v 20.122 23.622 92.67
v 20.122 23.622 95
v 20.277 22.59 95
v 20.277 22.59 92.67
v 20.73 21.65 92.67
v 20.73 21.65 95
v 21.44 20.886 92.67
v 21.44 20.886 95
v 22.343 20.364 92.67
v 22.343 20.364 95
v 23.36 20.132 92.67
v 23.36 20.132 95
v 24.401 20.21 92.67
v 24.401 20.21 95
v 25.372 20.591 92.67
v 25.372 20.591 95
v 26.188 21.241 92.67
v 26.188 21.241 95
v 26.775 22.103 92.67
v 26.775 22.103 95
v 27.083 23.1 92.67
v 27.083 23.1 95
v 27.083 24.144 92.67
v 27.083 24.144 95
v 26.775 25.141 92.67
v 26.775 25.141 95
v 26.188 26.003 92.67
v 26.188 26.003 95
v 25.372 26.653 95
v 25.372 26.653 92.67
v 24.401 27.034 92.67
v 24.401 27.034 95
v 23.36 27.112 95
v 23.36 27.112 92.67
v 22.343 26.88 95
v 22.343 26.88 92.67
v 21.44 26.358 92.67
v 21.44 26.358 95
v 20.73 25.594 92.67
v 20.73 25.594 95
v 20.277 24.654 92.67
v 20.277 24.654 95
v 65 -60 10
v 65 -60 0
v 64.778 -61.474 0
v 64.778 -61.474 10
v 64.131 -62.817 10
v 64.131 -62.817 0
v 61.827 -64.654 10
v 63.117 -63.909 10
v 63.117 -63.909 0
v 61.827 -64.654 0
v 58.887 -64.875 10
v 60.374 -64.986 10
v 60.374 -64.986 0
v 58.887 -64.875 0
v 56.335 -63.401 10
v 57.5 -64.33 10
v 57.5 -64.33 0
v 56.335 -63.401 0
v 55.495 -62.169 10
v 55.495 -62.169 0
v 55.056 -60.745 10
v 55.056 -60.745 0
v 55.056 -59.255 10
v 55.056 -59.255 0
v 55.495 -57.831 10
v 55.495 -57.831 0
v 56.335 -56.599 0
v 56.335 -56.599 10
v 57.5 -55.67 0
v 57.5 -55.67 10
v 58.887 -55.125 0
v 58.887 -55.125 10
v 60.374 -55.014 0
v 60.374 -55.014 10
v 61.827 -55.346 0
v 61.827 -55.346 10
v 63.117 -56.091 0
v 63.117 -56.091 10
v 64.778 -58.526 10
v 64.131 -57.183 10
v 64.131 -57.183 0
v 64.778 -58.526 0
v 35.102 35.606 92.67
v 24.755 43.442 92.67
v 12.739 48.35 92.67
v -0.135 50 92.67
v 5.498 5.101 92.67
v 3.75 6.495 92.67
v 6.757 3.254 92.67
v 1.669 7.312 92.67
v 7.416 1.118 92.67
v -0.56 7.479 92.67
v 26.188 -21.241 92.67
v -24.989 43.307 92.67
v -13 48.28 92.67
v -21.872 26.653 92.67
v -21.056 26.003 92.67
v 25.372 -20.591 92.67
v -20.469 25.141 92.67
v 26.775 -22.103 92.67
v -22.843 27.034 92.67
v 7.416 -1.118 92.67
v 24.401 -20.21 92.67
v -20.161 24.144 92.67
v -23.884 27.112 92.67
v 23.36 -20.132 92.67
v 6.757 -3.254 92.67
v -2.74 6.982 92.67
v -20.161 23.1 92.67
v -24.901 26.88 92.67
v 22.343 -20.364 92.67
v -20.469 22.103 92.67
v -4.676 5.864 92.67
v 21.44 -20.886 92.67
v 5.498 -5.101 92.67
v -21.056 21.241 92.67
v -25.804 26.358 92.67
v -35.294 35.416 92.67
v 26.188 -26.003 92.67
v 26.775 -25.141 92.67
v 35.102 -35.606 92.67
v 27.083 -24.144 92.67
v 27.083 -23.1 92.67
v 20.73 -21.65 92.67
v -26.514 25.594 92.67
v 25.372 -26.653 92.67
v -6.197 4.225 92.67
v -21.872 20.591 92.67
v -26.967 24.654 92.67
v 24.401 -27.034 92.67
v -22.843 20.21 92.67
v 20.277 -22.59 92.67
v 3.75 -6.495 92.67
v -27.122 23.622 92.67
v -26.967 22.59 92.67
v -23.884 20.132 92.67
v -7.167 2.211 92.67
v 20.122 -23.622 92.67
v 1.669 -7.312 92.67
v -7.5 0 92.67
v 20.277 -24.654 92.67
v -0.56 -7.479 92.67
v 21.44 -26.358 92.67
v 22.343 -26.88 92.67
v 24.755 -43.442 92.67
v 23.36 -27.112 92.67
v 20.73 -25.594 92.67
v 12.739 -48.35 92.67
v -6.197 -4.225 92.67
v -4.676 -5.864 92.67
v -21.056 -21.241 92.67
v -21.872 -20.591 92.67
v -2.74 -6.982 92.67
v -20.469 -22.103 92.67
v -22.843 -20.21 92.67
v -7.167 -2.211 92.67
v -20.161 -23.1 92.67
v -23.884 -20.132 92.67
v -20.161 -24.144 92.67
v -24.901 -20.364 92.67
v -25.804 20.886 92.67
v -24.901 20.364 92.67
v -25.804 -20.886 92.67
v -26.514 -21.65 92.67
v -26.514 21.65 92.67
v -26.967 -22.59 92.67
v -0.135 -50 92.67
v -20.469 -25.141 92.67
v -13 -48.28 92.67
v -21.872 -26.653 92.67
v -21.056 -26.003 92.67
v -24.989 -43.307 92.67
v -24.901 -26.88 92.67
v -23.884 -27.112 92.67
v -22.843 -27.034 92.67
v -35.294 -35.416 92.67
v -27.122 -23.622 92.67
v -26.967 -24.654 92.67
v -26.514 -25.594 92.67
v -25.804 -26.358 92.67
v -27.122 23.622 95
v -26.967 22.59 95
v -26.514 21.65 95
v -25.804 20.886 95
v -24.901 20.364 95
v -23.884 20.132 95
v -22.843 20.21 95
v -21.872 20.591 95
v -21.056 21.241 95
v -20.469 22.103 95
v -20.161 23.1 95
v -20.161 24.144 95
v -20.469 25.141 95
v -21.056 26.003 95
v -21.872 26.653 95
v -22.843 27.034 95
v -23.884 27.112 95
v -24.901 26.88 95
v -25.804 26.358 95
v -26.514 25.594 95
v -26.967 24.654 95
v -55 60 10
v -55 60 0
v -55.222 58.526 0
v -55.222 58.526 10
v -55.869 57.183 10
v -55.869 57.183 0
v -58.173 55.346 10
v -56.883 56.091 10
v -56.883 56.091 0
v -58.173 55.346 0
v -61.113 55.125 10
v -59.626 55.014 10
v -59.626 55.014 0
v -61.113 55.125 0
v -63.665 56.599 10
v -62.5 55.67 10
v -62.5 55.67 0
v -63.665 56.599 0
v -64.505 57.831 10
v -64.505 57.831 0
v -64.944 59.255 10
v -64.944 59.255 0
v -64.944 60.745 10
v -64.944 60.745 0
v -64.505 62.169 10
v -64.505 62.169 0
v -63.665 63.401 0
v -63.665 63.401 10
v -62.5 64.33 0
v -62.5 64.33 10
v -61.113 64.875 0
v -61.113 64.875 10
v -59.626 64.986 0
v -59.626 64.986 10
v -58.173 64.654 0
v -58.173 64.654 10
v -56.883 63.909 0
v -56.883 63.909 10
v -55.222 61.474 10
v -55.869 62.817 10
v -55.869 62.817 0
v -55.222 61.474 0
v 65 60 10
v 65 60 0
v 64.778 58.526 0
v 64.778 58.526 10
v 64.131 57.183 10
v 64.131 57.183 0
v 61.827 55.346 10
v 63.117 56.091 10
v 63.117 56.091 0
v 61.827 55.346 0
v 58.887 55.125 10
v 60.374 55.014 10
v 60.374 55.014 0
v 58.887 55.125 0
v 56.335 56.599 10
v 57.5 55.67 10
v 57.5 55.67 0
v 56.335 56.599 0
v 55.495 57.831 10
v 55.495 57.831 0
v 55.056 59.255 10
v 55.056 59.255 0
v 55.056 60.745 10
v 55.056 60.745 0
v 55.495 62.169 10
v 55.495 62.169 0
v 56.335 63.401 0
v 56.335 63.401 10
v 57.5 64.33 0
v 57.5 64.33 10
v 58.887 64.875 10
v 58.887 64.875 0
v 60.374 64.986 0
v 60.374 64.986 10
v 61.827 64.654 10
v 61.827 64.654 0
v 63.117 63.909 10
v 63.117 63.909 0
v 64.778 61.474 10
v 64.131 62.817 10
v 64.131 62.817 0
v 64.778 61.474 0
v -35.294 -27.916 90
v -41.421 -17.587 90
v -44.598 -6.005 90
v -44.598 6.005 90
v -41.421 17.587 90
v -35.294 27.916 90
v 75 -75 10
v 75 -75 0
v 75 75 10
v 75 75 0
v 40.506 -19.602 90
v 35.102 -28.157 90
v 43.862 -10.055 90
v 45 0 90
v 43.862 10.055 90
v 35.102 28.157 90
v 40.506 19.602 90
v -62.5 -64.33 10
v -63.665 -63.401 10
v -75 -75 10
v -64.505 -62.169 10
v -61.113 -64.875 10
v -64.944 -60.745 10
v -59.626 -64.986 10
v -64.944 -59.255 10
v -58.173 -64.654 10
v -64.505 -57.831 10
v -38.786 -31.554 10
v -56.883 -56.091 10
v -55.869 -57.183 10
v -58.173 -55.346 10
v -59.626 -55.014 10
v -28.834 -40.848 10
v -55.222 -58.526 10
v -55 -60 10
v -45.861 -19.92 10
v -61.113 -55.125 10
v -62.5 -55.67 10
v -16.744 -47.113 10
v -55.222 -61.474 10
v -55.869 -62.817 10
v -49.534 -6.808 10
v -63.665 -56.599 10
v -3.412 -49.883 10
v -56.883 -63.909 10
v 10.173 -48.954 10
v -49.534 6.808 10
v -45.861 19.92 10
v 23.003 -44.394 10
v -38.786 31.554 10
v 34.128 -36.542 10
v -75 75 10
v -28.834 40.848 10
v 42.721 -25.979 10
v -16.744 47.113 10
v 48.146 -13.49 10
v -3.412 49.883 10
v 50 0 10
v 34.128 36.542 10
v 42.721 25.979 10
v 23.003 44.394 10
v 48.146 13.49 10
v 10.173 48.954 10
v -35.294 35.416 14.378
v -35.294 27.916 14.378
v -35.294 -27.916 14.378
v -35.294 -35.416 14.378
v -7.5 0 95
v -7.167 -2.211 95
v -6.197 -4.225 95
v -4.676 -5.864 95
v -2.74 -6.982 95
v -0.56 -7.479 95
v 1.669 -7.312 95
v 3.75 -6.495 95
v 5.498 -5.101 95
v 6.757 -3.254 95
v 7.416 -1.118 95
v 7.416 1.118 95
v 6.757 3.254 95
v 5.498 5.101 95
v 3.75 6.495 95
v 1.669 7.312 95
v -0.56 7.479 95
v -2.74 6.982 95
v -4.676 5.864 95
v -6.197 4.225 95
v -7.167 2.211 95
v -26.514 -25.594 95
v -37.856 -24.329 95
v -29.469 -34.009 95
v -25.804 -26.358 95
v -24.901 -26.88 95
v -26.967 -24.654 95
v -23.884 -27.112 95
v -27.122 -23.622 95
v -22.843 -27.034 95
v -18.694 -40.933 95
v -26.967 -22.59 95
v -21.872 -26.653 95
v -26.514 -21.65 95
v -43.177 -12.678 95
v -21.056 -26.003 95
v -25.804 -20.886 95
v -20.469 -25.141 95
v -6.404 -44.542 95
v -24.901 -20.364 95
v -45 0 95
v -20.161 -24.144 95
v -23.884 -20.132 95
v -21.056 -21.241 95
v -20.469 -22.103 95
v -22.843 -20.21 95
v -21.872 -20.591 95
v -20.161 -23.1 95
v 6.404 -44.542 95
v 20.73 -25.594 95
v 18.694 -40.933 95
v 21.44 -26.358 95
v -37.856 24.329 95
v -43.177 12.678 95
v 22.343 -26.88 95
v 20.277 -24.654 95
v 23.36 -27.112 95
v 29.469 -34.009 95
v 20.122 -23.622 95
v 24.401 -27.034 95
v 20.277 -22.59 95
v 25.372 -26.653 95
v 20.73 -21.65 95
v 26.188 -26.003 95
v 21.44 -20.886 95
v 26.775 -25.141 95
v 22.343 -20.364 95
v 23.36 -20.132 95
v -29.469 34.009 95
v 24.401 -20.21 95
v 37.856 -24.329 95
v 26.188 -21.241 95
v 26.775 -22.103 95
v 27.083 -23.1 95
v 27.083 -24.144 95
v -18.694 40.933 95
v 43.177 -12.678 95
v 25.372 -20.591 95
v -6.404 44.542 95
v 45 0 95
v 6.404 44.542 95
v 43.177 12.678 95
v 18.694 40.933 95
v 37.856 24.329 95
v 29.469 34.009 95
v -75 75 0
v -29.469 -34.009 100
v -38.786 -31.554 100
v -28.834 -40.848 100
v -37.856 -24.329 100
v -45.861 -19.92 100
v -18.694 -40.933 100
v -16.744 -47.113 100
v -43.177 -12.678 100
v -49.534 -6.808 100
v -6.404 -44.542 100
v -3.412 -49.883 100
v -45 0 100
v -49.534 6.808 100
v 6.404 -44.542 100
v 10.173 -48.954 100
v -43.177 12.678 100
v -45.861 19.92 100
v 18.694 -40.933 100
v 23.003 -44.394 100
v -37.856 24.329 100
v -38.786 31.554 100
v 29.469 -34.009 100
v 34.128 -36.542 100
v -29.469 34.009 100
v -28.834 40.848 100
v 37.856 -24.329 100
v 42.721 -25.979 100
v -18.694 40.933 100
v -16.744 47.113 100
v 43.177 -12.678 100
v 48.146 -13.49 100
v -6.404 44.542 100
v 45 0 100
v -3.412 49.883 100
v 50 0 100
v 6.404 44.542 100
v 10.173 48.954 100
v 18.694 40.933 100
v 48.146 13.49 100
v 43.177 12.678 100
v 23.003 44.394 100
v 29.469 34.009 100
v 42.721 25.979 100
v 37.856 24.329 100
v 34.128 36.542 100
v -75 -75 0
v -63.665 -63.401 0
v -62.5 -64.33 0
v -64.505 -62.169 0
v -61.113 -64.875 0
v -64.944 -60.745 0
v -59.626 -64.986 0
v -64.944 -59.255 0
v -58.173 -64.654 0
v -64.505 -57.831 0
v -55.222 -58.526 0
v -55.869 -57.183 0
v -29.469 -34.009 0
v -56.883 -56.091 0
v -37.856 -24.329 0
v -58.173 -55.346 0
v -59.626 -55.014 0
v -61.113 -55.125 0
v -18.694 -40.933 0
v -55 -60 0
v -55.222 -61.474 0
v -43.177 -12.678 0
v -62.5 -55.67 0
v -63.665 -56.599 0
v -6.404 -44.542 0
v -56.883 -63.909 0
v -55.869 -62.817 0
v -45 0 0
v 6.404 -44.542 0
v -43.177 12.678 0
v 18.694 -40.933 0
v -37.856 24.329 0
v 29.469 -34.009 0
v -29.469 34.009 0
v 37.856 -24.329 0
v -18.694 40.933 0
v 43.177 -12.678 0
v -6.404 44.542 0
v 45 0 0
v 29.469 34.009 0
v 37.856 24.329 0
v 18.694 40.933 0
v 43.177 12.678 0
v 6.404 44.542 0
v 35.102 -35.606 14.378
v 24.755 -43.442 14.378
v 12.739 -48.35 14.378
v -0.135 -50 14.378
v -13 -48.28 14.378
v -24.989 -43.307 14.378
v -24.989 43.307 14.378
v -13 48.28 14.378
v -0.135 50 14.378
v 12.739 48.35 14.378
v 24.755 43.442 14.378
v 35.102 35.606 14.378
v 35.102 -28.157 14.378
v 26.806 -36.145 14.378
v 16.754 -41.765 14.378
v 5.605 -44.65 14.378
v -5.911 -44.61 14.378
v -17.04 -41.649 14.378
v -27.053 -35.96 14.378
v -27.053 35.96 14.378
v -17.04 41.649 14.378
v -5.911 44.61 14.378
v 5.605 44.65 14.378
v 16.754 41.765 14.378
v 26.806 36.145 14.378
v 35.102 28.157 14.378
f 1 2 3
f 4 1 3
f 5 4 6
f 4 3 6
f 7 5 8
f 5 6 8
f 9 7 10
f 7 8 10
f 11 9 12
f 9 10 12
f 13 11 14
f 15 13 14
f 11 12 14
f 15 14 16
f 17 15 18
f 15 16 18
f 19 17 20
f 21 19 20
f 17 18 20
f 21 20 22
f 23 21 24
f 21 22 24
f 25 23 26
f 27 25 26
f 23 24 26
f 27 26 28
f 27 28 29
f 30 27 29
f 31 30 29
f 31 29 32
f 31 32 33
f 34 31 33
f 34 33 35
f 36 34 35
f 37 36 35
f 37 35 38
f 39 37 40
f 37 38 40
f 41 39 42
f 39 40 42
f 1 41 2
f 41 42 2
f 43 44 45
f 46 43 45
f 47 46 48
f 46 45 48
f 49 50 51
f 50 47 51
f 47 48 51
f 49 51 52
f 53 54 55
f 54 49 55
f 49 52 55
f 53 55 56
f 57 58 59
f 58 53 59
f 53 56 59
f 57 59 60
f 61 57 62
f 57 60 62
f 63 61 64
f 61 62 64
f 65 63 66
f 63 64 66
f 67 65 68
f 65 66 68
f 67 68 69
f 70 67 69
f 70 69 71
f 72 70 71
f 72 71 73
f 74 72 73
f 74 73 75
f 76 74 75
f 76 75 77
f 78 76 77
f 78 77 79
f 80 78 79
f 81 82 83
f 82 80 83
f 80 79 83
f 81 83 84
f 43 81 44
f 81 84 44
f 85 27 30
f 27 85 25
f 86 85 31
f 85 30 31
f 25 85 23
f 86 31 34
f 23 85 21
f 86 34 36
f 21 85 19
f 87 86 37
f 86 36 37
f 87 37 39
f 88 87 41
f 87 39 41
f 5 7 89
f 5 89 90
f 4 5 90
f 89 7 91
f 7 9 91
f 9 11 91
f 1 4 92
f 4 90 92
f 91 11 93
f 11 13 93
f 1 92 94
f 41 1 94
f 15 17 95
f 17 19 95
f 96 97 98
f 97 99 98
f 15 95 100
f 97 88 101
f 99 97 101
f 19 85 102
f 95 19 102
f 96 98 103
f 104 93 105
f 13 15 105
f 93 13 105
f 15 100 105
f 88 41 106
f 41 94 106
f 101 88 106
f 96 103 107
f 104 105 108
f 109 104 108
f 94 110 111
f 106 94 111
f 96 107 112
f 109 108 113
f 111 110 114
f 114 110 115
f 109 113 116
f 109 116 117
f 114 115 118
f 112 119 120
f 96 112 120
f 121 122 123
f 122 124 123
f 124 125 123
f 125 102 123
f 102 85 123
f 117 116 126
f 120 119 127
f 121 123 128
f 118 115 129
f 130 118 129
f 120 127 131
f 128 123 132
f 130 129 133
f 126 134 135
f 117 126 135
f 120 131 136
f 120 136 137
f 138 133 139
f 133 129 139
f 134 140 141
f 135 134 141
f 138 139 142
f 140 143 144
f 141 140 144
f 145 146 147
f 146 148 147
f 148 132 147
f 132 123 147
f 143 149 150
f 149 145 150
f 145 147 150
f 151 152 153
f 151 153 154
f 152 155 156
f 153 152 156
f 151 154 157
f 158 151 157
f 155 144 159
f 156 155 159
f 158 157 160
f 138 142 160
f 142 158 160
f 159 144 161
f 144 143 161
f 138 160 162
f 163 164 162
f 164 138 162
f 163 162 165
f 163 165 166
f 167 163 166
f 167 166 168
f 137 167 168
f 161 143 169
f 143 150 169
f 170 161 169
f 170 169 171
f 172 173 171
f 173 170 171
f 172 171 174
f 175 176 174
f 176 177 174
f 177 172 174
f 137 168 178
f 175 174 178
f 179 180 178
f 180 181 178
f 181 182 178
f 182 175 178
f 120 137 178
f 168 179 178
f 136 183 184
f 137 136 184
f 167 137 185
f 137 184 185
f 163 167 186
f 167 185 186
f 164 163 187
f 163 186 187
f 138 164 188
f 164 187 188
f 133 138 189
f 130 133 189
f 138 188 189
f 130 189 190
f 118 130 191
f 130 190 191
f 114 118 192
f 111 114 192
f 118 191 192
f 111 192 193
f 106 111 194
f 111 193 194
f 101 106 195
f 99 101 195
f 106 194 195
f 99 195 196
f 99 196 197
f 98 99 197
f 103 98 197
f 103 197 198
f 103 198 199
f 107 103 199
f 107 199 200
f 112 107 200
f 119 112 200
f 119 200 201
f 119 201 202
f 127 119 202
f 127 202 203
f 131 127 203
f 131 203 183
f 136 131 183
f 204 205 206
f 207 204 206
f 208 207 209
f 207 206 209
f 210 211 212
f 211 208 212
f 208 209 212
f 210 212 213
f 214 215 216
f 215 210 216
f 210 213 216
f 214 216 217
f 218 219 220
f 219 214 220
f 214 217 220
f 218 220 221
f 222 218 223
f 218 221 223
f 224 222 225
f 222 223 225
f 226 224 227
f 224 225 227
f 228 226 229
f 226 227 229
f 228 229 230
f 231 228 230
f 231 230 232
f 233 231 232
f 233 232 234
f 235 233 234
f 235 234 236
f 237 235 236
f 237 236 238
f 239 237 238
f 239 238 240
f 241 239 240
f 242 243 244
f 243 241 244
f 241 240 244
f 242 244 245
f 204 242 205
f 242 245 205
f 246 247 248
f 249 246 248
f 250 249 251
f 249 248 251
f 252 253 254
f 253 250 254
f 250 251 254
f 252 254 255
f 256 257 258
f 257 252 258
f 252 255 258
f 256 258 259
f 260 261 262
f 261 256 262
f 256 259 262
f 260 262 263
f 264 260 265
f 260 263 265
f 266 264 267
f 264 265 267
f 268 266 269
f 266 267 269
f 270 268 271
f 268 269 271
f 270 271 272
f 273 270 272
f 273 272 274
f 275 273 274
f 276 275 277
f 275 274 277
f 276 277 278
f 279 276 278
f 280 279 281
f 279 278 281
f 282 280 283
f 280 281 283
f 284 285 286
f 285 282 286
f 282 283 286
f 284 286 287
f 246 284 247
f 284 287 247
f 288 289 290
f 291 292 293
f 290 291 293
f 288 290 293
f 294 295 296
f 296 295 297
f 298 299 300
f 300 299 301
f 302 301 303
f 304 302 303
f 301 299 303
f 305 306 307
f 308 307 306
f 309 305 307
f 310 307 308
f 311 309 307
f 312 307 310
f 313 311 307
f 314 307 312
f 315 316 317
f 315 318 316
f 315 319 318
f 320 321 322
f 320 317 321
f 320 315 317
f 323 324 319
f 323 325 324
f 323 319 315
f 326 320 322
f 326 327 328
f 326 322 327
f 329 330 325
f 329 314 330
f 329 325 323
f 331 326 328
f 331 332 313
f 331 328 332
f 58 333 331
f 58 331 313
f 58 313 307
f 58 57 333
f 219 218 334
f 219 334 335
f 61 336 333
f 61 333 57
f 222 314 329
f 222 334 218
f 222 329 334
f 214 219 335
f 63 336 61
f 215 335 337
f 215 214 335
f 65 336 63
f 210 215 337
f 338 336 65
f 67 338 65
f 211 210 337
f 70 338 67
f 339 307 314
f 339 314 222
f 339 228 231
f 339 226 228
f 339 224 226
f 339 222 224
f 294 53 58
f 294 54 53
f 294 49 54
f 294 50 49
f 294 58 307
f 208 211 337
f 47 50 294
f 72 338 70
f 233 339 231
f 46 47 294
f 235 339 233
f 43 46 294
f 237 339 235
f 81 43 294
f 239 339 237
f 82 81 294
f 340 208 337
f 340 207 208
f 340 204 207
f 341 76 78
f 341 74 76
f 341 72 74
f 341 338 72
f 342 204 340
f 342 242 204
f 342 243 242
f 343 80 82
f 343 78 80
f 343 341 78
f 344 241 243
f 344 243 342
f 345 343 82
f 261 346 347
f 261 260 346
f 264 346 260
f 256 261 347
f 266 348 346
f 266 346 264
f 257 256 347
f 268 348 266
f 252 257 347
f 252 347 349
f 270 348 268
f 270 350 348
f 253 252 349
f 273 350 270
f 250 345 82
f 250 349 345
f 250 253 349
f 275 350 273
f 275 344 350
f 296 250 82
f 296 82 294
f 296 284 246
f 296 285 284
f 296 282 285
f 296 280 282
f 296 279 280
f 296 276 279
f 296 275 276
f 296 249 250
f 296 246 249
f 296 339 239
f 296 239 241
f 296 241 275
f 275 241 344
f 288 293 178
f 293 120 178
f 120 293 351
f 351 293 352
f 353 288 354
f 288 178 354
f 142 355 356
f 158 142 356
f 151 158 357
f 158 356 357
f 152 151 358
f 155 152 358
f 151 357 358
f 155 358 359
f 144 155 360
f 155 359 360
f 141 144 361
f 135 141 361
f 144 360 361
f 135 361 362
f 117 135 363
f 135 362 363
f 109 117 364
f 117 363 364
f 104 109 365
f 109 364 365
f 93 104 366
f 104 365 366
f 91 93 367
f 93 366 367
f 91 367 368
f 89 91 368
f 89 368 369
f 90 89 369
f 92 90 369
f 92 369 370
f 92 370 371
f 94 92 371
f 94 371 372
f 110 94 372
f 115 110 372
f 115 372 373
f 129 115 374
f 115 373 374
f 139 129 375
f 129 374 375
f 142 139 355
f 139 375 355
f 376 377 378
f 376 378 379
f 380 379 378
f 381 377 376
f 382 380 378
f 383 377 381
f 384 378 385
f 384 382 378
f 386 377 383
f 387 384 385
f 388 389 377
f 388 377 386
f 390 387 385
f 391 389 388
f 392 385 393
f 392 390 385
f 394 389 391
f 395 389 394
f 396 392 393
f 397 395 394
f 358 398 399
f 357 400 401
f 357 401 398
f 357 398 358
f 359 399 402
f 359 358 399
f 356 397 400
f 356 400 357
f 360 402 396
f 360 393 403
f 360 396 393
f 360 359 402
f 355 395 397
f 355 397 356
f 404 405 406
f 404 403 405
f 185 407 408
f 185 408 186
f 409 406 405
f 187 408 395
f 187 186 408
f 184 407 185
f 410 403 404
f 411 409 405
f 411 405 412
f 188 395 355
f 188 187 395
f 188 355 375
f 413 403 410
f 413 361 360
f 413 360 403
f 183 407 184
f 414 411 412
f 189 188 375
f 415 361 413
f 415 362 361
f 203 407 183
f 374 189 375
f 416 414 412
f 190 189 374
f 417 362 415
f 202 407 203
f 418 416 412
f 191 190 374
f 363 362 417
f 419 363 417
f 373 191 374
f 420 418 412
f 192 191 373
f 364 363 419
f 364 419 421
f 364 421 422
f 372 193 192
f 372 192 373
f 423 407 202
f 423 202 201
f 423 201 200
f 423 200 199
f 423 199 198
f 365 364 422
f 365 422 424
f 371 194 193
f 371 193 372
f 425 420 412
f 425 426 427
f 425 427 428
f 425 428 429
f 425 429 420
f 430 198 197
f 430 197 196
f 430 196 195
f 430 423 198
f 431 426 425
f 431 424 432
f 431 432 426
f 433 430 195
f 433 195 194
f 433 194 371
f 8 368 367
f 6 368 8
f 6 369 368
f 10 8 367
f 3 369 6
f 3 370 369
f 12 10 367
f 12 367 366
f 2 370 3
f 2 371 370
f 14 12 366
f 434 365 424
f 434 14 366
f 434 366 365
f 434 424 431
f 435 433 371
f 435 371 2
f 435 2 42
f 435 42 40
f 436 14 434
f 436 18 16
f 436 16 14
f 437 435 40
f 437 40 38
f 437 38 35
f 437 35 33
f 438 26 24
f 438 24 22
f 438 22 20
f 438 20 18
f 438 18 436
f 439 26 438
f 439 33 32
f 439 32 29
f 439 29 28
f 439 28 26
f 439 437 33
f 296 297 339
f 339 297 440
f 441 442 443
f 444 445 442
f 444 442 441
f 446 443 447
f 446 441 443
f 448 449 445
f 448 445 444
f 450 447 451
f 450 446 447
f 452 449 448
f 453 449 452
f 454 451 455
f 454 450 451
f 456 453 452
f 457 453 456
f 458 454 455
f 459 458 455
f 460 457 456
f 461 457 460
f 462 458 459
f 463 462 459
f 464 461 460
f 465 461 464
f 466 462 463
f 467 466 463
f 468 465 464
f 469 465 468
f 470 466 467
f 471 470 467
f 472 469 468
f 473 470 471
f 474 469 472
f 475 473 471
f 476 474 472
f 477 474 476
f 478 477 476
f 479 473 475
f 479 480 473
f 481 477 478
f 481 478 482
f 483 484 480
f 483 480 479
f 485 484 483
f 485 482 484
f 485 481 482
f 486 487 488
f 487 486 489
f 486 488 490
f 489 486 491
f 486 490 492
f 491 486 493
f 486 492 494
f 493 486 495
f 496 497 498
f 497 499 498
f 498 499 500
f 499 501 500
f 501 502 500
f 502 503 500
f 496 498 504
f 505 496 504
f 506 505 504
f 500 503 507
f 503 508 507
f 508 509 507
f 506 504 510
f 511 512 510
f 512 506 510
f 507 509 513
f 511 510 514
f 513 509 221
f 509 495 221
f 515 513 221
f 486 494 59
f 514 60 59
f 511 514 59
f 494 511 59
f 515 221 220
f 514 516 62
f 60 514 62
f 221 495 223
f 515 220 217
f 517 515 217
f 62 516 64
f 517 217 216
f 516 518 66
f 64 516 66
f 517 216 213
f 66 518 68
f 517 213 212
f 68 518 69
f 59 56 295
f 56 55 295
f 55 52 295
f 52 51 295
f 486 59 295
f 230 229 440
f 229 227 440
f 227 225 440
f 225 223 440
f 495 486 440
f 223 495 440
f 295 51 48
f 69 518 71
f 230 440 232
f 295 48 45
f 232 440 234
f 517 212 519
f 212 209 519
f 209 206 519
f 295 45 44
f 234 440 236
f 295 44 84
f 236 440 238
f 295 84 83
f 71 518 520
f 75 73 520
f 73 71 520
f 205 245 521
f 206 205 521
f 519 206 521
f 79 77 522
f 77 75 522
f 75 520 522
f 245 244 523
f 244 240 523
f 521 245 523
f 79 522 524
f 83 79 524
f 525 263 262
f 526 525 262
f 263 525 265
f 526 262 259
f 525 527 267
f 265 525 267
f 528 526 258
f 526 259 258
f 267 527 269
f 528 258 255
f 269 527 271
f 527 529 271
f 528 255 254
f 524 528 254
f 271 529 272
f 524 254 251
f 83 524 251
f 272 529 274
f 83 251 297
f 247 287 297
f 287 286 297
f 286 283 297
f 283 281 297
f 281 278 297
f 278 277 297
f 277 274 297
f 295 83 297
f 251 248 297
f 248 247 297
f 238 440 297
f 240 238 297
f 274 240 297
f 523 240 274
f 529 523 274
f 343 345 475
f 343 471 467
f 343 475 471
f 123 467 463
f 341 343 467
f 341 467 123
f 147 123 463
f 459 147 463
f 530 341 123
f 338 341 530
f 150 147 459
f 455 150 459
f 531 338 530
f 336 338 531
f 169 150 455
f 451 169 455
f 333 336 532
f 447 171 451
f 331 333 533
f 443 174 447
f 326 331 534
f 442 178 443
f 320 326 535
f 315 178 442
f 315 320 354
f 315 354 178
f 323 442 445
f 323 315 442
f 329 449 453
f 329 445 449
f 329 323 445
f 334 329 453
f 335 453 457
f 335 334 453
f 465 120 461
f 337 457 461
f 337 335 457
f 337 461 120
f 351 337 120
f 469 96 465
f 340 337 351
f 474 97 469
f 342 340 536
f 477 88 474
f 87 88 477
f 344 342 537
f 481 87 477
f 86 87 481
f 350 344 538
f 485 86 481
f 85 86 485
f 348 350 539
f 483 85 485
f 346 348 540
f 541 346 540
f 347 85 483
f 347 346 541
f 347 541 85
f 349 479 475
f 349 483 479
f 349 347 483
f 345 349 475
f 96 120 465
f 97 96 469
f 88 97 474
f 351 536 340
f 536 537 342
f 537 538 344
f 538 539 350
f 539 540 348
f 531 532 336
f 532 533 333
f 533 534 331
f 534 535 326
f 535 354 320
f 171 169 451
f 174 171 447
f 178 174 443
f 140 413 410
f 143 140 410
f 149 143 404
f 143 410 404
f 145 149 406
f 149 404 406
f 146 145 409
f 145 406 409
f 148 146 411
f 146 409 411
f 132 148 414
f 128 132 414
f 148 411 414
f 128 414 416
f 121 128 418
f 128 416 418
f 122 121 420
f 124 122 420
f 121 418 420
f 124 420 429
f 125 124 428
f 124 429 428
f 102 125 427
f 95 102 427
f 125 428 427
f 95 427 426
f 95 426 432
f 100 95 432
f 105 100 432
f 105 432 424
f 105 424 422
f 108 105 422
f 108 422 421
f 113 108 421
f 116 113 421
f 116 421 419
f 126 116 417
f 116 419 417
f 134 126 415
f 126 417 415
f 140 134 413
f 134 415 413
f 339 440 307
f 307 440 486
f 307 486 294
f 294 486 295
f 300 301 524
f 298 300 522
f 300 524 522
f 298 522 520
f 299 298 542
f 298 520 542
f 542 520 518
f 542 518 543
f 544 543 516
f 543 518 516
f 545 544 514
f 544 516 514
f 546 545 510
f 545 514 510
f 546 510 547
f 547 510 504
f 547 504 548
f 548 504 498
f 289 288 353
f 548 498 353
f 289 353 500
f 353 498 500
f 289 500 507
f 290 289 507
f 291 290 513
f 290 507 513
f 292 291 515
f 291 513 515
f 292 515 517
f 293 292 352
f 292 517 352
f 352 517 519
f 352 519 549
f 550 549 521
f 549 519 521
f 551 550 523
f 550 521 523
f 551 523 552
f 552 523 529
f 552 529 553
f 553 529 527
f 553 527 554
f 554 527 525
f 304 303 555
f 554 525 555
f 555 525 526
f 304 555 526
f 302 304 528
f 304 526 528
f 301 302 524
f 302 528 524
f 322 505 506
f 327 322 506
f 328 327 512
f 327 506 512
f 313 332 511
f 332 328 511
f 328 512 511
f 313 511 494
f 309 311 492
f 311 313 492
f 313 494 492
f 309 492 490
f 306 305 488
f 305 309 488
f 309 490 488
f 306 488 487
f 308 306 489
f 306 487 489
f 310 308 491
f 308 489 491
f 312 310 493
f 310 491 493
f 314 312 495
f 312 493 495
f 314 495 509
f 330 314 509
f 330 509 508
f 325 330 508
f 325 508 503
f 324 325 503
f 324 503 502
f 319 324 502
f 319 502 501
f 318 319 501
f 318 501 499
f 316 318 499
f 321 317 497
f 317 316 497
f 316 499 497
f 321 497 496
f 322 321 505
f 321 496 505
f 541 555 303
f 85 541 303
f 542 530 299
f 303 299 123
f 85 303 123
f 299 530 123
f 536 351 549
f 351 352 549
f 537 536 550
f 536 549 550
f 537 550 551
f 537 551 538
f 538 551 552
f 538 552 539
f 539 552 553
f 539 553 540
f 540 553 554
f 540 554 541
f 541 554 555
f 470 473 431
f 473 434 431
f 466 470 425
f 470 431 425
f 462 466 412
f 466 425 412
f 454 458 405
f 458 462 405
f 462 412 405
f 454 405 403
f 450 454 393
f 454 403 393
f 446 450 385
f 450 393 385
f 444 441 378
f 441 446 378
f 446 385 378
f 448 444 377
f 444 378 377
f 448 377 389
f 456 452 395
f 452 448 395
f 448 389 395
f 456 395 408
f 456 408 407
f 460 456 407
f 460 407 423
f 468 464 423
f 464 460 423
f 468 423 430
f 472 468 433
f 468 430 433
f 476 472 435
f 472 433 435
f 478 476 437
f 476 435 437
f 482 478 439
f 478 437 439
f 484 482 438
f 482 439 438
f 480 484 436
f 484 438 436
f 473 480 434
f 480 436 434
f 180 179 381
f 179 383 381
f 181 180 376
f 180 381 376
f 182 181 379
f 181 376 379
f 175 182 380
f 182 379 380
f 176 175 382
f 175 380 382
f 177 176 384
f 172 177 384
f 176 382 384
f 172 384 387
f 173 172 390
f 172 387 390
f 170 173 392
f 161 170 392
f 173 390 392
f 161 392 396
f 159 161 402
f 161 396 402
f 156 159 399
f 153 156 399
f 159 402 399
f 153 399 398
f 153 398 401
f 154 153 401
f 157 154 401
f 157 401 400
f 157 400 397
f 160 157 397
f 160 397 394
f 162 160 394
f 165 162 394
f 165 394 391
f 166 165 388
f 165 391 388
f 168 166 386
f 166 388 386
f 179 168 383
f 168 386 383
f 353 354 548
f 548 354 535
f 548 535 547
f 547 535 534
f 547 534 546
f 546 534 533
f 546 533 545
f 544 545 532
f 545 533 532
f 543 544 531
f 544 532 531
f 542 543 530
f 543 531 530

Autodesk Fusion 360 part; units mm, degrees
sketch "Sketch1" plane through (0, 0, 0) normal (0, 0, 1) x (1, 0, 0)
  line L0 (75, 75) -> (-75, 75)
  line L1 (-75, 75) -> (-75, -75)
  line L2 (-75, -75) -> (75, -75)
  line L3 (75, -75) -> (75, 75)
  line L4 (75, 75) -> (-75, -75) construction
  line L5 (-75, 75) -> (75, -75) construction
  circle A0 centre (-60, 60) radius 5
  circle A1 centre (60, 60) radius 5
  circle A2 centre (-60, -60) radius 5
  circle A3 centre (60, -60) radius 5
  circle A4 centre (0, 0) radius 50
  circle A5 centre (0, 0) radius 45
  dimension "d1" = 150
  dimension "d2" = 150
  dimension "d3" = 10
  dimension "d4" = 10
  dimension "d5" = 10
  dimension "d6" = 10
  dimension "d7" = 100
  dimension "d8" = 90
extrude "Extrude1" add sketch "Sketch1" along normal blind 10 contours L0 L1 L2 L3
extrude "Extrude2" add sketch "Sketch1" along normal blind 100 contours A4
extrude "Extrude3" add sketch "Sketch1" along normal blind 95 contours A5
extrude "Extrude4" cut sketch "Sketch1" along normal blind 90 contours A5
sketch "Sketch2" plane through (0, 0, 95) normal (0, 0, 1) x (-1, 0, 0)
  circle A0 centre (0, 0) radius 45
  circle A1 centre (0, 0) radius 7.5
  dimension "d17" = 15
extrude "Extrude5" cut sketch "Sketch2" against normal blind 10 contours A1
sketch "Sketch3" plane through (0, 0, 0) normal (0, 1, 0) x (1, 0, 0)
  line L0 (35.1024, -92.6698) -> (-35.2945, -92.6698)
  line L1 (-35.2945, -92.6698) -> (-35.2945, -14.3779)
  line L2 (-35.2945, -14.3779) -> (35.1024, -14.3779)
  line L3 (35.1024, -14.3779) -> (35.1024, -92.6698)
  line L4 (35.1024, -92.6698) -> (-35.2945, -14.3779) construction
  line L5 (-35.2945, -92.6698) -> (35.1024, -14.3779) construction
  point P0 (-0.096, -53.5238)
extrude "Extrude6" cut sketch "Sketch3" along normal mid plane 120
sketch "Sketch4" plane through (0, 0, 95) normal (0, 0, 1) x (-1, 0, 0)
  line L0 (23.622, 23.622) -> (-23.622, 23.622)
  line L1 (-23.622, 23.622) -> (-23.622, -23.622)
  line L2 (-23.622, -23.622) -> (23.622, -23.622)
  line L3 (23.622, -23.622) -> (23.622, 23.622)
  line L4 (23.622, 23.622) -> (-23.622, -23.622) construction
  line L5 (-23.622, 23.622) -> (23.622, -23.622) construction
  circle A0 centre (23.622, 23.622) radius 3.5
  circle A1 centre (-23.622, 23.622) radius 3.5
  circle A2 centre (23.622, -23.622) radius 3.5
  circle A3 centre (-23.622, -23.622) radius 3.5
  dimension "d22" = 47.244
  dimension "d23" = 47.244
  dimension "d24" = 7
  dimension "d25" = 7
  dimension "d26" = 7
  dimension "d27" = 7
extrude "Extrude7" cut sketch "Sketch4" against normal blind 10 contours L0 L1 A1 | L0 L1 A1 | L0 L3 A0 | L0 L3 A0 | L1 L2 A3 | L1 L2 A3 | L2 L3 A2 | L2 L3 A2
